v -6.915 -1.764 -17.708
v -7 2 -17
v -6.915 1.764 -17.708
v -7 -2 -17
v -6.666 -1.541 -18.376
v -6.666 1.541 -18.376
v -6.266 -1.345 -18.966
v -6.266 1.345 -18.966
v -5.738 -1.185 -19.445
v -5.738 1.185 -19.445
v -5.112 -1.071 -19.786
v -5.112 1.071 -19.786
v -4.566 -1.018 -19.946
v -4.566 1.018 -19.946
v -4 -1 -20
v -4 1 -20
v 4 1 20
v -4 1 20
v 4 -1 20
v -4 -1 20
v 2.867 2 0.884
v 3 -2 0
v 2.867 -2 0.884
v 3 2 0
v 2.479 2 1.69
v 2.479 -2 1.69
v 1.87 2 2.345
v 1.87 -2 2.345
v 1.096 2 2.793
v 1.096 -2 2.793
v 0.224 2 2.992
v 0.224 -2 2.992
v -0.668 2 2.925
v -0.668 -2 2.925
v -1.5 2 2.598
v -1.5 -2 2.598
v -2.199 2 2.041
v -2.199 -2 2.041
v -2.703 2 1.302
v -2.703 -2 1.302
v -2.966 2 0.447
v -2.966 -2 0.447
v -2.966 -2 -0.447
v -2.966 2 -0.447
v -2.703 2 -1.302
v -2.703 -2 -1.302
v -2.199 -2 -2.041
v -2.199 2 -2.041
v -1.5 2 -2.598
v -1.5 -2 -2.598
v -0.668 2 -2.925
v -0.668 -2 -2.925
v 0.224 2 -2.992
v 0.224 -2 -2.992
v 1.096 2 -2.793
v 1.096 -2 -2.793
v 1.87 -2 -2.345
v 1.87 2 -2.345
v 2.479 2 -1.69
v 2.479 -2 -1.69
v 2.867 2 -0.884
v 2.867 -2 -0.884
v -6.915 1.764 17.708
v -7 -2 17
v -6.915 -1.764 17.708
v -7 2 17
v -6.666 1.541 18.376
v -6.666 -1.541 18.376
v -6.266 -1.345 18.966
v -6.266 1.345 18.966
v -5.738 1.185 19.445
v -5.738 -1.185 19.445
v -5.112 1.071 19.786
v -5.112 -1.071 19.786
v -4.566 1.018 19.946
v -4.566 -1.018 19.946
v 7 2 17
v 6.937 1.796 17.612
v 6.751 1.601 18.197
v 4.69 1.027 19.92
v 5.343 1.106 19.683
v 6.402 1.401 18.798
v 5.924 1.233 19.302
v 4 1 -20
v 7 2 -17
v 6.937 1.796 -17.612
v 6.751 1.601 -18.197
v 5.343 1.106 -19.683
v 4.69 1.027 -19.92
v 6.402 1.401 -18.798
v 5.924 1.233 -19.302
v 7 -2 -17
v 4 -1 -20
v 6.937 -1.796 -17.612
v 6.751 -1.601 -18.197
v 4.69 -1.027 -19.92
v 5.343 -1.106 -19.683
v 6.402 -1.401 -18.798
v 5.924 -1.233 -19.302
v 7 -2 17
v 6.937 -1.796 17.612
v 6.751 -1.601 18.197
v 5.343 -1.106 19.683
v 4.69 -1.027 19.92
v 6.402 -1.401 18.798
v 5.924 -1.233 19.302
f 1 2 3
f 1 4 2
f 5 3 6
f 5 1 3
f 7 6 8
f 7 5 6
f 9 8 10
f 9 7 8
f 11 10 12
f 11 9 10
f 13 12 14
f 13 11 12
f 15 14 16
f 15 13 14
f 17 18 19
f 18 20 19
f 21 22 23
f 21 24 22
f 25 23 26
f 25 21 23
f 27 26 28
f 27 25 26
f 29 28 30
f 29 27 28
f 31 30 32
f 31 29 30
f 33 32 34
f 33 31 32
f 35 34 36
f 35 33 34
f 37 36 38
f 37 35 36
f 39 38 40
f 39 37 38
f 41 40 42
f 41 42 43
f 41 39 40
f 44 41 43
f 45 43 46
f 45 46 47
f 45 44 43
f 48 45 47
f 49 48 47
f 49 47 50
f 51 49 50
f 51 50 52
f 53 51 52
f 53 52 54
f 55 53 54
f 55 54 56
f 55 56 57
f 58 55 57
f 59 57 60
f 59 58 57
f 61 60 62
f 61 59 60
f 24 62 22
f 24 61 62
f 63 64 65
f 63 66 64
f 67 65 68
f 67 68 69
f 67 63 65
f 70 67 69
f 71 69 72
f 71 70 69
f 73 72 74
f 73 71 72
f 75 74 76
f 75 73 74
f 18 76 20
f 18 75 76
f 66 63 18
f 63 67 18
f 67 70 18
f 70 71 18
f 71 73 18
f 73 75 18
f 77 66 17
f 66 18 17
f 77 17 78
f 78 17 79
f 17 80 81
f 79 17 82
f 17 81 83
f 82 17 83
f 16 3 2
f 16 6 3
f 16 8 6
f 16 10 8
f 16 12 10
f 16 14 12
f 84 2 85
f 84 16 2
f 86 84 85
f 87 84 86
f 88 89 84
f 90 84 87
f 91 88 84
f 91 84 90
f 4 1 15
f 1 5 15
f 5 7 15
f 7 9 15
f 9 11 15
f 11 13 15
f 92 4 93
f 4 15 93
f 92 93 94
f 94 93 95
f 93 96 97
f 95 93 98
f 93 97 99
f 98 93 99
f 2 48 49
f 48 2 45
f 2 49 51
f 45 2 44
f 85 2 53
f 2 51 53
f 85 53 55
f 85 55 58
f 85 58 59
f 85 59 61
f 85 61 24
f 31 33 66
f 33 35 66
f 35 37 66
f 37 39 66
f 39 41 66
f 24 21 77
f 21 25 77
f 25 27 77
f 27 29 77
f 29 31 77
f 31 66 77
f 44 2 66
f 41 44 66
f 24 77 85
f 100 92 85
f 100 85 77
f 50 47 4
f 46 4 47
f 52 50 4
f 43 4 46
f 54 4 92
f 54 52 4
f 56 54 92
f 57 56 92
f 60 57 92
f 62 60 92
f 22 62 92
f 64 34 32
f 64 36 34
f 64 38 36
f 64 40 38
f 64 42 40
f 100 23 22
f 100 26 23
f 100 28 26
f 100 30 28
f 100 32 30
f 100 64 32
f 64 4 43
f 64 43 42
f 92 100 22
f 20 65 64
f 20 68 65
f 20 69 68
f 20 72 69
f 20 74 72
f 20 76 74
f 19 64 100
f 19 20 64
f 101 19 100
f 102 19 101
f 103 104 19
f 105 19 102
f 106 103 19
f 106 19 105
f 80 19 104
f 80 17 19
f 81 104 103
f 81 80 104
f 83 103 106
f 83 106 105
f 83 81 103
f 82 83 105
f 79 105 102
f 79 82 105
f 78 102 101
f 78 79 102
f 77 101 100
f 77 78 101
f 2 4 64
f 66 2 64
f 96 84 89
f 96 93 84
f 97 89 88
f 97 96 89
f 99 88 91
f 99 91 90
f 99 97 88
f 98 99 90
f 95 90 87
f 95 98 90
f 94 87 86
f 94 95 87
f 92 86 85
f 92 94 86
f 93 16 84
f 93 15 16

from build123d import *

# Parameters (mm, degrees)
F0_W       = 14
F0_H       = 40
F0_R       = 3
F1_DEPTH   = 2
F2_SIZE2   = 1
F2_SIZE    = 3
F2_2_SIZE2 = 1
F2_2_SIZE  = 3
F3_R       = 3


with BuildPart() as f1:
    # F0 (on Front) → F1 (new body, symmetric)
    with BuildSketch(Plane.XZ):
        Rectangle(F0_W, F0_H)
        Circle(F0_R, mode=Mode.SUBTRACT)
    extrude(amount=F1_DEPTH, both=True)

    # F2
    f2_edges = [f1.edges().sort_by_distance(p)[0] for p in [
        (0, -2, 20),
        (0, -2, -20),
    ]]
    f2_side = f1.faces().sort_by_distance((6.576208, -2, 0))[0]
    chamfer(f2_edges, length=F2_SIZE, length2=F2_SIZE2, reference=f2_side)

    # F2#2
    f2_2_edges = [f1.edges().sort_by_distance(p)[0] for p in [
        (0, 2, 20),
        (0, 2, -20),
    ]]
    f2_2_side = f1.faces().sort_by_distance((6.576208, 2, 0))[0]
    chamfer(f2_2_edges, length=F2_2_SIZE, length2=F2_2_SIZE2, reference=f2_2_side)

    # F3
    f3_edges = [f1.edges().sort_by_distance(p)[0] for p in [
        (7, 0, 20),
        (-7, 0, 20),
        (7, 0, -20),
        (-7, 0, -20),
    ]]
    fillet(f3_edges, radius=F3_R)


solid = f1.part
